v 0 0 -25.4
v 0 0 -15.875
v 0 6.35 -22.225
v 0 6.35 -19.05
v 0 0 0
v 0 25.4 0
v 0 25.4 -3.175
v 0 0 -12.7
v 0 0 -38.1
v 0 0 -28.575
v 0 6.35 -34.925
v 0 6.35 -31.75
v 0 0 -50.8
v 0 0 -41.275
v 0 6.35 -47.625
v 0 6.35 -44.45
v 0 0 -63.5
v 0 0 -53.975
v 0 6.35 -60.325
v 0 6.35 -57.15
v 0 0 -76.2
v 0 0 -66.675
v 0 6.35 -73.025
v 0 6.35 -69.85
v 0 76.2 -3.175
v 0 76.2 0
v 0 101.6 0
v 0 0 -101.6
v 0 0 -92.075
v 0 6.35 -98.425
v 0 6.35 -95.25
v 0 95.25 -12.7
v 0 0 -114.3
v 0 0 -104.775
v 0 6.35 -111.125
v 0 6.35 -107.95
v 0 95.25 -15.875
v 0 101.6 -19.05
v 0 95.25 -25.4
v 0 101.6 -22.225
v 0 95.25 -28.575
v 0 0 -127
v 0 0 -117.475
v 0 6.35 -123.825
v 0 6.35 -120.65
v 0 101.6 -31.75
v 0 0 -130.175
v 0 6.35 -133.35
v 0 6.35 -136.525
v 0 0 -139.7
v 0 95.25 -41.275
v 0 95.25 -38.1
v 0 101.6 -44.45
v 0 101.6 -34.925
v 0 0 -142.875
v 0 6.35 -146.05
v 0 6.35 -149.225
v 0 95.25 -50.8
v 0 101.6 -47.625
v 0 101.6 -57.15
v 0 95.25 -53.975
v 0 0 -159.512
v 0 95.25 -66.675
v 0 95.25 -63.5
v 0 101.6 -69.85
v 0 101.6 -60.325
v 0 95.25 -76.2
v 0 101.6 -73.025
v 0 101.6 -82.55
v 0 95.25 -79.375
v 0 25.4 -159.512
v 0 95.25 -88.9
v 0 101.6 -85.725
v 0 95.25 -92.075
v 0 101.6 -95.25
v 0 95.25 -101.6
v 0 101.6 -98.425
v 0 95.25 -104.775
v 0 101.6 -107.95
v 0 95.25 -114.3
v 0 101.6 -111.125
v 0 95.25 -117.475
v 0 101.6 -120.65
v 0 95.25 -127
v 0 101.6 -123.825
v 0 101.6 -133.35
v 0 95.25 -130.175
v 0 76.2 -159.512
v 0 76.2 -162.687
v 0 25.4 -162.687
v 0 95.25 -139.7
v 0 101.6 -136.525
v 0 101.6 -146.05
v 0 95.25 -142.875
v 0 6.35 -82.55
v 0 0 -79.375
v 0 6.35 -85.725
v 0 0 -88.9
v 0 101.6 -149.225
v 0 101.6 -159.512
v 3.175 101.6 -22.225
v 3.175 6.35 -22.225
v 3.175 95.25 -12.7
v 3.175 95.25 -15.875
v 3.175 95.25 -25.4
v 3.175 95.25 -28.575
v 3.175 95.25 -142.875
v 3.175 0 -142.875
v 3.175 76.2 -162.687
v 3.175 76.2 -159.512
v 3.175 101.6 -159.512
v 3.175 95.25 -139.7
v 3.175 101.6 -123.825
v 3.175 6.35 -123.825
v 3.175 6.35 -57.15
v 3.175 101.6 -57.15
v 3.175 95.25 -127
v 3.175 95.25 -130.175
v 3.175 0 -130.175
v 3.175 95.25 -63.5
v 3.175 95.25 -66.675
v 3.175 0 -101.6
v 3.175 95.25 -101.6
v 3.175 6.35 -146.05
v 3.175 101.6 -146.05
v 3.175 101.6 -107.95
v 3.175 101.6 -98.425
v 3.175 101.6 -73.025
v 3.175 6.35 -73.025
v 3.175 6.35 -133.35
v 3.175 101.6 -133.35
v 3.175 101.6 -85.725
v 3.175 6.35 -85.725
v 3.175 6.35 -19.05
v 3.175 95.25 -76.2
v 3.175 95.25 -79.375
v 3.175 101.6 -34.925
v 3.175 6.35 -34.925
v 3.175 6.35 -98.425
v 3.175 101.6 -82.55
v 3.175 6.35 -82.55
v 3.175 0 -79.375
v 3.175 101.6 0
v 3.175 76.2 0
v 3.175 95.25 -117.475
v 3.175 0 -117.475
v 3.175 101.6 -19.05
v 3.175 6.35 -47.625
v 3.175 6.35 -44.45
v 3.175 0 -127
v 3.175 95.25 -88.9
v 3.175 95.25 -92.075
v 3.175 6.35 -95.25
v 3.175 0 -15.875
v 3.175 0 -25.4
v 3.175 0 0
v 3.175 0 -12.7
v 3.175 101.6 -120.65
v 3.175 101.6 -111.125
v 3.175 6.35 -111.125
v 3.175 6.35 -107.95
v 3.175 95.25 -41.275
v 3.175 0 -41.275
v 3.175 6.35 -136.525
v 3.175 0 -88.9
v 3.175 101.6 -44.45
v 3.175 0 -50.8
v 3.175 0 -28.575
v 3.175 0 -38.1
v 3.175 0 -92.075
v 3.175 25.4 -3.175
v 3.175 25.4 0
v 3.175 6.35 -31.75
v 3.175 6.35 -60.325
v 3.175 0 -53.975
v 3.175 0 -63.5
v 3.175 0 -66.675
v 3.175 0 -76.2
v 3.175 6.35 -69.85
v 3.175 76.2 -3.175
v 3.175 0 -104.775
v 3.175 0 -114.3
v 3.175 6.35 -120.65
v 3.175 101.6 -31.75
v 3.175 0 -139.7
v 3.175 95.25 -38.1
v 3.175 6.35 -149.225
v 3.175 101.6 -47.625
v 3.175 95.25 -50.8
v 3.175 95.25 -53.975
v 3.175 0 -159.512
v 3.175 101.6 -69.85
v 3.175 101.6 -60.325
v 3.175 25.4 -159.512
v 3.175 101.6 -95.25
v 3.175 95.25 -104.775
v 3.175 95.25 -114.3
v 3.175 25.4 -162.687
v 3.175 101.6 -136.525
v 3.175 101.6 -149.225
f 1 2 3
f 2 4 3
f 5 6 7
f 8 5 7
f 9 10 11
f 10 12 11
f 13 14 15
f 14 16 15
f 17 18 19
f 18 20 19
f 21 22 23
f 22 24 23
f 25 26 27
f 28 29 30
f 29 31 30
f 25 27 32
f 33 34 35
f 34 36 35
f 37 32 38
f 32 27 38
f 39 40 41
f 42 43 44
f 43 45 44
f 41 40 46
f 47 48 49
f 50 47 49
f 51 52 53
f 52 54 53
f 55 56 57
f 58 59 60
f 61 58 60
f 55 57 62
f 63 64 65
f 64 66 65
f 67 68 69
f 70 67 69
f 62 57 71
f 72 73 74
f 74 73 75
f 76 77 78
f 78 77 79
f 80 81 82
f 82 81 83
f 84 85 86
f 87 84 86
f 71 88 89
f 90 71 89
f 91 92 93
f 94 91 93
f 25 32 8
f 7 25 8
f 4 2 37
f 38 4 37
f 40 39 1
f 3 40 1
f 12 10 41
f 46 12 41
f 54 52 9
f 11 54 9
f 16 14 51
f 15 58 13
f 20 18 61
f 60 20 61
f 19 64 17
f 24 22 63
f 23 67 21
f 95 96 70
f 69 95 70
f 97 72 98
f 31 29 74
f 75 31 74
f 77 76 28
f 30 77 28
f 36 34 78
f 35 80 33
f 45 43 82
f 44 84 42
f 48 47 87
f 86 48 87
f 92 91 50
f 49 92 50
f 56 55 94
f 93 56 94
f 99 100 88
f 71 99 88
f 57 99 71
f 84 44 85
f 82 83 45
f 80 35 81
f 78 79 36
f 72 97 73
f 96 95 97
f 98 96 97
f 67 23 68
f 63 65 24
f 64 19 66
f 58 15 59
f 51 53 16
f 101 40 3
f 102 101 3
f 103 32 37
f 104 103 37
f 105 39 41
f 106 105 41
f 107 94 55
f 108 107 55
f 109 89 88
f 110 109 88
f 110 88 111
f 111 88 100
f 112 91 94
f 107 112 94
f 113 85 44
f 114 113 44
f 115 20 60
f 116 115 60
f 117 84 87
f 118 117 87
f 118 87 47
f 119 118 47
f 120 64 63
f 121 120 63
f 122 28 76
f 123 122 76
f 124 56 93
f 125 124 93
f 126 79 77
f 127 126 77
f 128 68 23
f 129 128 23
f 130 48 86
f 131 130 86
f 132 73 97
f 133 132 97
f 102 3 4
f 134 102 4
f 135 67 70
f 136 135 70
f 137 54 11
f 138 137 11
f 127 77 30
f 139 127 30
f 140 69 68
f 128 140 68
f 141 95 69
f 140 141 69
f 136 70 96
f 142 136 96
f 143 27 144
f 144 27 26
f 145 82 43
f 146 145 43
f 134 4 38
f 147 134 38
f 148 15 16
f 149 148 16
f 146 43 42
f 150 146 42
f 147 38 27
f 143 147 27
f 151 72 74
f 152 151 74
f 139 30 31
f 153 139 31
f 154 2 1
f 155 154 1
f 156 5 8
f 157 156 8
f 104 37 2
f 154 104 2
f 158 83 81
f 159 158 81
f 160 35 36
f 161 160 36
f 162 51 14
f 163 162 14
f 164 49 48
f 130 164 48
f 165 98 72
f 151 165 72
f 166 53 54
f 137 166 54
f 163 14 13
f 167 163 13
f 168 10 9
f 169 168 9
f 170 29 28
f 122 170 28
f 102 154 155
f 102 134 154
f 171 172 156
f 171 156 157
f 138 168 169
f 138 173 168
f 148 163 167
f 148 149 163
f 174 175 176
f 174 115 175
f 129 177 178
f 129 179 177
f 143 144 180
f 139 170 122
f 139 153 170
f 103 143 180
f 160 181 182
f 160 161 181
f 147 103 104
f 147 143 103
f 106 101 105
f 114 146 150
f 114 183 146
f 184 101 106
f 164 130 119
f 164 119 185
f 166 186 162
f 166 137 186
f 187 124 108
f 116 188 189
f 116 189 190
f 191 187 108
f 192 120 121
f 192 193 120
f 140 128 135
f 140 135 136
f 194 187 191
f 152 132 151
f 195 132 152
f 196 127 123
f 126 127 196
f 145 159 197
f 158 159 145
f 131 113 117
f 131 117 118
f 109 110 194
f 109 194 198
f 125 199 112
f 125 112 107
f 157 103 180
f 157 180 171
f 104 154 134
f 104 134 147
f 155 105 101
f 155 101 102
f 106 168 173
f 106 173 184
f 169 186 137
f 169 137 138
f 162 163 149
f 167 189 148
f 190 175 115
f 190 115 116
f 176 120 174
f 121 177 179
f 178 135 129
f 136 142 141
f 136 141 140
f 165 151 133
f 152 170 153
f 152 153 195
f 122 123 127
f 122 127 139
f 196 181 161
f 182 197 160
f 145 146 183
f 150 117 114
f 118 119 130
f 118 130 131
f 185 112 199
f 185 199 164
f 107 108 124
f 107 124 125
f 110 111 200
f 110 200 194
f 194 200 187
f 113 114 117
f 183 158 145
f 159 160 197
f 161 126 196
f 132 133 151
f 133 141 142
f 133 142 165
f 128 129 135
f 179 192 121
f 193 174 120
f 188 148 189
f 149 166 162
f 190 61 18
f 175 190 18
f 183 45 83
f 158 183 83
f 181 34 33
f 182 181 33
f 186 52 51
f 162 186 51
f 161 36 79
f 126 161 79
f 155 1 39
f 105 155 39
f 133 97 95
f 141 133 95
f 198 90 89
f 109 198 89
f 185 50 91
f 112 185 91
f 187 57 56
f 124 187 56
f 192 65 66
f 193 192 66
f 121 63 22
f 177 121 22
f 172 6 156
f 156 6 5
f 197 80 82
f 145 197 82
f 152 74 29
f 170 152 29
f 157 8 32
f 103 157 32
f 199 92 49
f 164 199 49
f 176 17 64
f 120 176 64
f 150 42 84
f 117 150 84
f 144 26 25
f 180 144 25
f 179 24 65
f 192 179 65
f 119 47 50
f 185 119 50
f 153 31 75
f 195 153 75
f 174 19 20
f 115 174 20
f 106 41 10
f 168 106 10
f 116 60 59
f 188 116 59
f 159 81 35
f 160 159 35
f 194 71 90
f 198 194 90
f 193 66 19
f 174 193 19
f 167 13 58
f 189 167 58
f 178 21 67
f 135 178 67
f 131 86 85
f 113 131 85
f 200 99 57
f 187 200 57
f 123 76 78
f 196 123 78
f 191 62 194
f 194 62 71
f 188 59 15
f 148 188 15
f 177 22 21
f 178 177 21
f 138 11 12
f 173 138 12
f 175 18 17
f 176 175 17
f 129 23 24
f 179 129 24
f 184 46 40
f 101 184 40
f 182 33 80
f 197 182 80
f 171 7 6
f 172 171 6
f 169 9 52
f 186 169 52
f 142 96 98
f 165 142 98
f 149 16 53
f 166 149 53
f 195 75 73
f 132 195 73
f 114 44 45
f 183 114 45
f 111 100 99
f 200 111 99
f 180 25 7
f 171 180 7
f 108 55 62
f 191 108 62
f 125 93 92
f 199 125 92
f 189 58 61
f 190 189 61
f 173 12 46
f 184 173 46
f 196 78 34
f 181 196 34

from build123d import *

# Parameters (mm, degrees)
BOSS_EXTRUDE2_DEPTH = 3.175


with BuildPart() as part:
    # Sketch2 → Boss-Extrude2 (new body)
    with BuildSketch(Plane(origin=(0, 0, 0), x_dir=(0, 0, -1), z_dir=(1, 0, 0))):
        Polygon((0, 101.6), (0, 76.2), (3.175, 76.2), (3.175, 25.4), (0, 25.4), (0, 0), (12.7, 0), (12.7, 95.25), (15.875, 95.25), (15.875, 0), (25.4, 0), (25.4, 95.25), (28.575, 95.25), (28.575, 0), (38.1, 0), (38.1, 95.25), (41.275, 95.25), (41.275, 0), (50.8, 0), (50.8, 95.25), (53.975, 95.25), (53.975, 0), (63.5, 0), (63.5, 95.25), (66.675, 95.25), (66.675, 0), (76.2, 0), (76.2, 95.25), (79.375, 95.25), (79.375, 0), (88.9, 0), (88.9, 95.25), (92.075, 95.25), (92.075, 0), (101.6, 0), (101.6, 95.25), (104.775, 95.25), (104.775, 0), (114.3, 0), (114.3, 95.25), (117.475, 95.25), (117.475, 0), (127, 0), (127, 95.25), (130.175, 95.25), (130.175, 0), (139.7, 0), (139.7, 95.25), (142.875, 95.25), (142.875, 0), (159.512, 0), (159.512, 25.4), (162.687, 25.4), (162.687, 76.2), (159.512, 76.2), (159.512, 101.6), (149.225, 101.6), (149.225, 6.35), (146.05, 6.35), (146.05, 101.6), (136.525, 101.6), (136.525, 6.35), (133.35, 6.35), (133.35, 101.6), (123.825, 101.6), (123.825, 6.35), (120.65, 6.35), (120.65, 101.6), (111.125, 101.6), (111.125, 6.35), (107.95, 6.35), (107.95, 101.6), (98.425, 101.6), (98.425, 6.35), (95.25, 6.35), (95.25, 101.6), (85.725, 101.6), (85.725, 6.35), (82.55, 6.35), (82.55, 101.6), (73.025, 101.6), (73.025, 6.35), (69.85, 6.35), (69.85, 101.6), (60.325, 101.6), (60.325, 6.35), (57.15, 6.35), (57.15, 101.6), (47.625, 101.6), (47.625, 6.35), (44.45, 6.35), (44.45, 101.6), (34.925, 101.6), (34.925, 6.35), (31.75, 6.35), (31.75, 101.6), (25.358279829, 101.6), (22.225, 101.6), (22.225, 6.35), (19.05, 6.35), (19.05, 101.6), align=None)
    extrude(amount=BOSS_EXTRUDE2_DEPTH)


solid = part.part
